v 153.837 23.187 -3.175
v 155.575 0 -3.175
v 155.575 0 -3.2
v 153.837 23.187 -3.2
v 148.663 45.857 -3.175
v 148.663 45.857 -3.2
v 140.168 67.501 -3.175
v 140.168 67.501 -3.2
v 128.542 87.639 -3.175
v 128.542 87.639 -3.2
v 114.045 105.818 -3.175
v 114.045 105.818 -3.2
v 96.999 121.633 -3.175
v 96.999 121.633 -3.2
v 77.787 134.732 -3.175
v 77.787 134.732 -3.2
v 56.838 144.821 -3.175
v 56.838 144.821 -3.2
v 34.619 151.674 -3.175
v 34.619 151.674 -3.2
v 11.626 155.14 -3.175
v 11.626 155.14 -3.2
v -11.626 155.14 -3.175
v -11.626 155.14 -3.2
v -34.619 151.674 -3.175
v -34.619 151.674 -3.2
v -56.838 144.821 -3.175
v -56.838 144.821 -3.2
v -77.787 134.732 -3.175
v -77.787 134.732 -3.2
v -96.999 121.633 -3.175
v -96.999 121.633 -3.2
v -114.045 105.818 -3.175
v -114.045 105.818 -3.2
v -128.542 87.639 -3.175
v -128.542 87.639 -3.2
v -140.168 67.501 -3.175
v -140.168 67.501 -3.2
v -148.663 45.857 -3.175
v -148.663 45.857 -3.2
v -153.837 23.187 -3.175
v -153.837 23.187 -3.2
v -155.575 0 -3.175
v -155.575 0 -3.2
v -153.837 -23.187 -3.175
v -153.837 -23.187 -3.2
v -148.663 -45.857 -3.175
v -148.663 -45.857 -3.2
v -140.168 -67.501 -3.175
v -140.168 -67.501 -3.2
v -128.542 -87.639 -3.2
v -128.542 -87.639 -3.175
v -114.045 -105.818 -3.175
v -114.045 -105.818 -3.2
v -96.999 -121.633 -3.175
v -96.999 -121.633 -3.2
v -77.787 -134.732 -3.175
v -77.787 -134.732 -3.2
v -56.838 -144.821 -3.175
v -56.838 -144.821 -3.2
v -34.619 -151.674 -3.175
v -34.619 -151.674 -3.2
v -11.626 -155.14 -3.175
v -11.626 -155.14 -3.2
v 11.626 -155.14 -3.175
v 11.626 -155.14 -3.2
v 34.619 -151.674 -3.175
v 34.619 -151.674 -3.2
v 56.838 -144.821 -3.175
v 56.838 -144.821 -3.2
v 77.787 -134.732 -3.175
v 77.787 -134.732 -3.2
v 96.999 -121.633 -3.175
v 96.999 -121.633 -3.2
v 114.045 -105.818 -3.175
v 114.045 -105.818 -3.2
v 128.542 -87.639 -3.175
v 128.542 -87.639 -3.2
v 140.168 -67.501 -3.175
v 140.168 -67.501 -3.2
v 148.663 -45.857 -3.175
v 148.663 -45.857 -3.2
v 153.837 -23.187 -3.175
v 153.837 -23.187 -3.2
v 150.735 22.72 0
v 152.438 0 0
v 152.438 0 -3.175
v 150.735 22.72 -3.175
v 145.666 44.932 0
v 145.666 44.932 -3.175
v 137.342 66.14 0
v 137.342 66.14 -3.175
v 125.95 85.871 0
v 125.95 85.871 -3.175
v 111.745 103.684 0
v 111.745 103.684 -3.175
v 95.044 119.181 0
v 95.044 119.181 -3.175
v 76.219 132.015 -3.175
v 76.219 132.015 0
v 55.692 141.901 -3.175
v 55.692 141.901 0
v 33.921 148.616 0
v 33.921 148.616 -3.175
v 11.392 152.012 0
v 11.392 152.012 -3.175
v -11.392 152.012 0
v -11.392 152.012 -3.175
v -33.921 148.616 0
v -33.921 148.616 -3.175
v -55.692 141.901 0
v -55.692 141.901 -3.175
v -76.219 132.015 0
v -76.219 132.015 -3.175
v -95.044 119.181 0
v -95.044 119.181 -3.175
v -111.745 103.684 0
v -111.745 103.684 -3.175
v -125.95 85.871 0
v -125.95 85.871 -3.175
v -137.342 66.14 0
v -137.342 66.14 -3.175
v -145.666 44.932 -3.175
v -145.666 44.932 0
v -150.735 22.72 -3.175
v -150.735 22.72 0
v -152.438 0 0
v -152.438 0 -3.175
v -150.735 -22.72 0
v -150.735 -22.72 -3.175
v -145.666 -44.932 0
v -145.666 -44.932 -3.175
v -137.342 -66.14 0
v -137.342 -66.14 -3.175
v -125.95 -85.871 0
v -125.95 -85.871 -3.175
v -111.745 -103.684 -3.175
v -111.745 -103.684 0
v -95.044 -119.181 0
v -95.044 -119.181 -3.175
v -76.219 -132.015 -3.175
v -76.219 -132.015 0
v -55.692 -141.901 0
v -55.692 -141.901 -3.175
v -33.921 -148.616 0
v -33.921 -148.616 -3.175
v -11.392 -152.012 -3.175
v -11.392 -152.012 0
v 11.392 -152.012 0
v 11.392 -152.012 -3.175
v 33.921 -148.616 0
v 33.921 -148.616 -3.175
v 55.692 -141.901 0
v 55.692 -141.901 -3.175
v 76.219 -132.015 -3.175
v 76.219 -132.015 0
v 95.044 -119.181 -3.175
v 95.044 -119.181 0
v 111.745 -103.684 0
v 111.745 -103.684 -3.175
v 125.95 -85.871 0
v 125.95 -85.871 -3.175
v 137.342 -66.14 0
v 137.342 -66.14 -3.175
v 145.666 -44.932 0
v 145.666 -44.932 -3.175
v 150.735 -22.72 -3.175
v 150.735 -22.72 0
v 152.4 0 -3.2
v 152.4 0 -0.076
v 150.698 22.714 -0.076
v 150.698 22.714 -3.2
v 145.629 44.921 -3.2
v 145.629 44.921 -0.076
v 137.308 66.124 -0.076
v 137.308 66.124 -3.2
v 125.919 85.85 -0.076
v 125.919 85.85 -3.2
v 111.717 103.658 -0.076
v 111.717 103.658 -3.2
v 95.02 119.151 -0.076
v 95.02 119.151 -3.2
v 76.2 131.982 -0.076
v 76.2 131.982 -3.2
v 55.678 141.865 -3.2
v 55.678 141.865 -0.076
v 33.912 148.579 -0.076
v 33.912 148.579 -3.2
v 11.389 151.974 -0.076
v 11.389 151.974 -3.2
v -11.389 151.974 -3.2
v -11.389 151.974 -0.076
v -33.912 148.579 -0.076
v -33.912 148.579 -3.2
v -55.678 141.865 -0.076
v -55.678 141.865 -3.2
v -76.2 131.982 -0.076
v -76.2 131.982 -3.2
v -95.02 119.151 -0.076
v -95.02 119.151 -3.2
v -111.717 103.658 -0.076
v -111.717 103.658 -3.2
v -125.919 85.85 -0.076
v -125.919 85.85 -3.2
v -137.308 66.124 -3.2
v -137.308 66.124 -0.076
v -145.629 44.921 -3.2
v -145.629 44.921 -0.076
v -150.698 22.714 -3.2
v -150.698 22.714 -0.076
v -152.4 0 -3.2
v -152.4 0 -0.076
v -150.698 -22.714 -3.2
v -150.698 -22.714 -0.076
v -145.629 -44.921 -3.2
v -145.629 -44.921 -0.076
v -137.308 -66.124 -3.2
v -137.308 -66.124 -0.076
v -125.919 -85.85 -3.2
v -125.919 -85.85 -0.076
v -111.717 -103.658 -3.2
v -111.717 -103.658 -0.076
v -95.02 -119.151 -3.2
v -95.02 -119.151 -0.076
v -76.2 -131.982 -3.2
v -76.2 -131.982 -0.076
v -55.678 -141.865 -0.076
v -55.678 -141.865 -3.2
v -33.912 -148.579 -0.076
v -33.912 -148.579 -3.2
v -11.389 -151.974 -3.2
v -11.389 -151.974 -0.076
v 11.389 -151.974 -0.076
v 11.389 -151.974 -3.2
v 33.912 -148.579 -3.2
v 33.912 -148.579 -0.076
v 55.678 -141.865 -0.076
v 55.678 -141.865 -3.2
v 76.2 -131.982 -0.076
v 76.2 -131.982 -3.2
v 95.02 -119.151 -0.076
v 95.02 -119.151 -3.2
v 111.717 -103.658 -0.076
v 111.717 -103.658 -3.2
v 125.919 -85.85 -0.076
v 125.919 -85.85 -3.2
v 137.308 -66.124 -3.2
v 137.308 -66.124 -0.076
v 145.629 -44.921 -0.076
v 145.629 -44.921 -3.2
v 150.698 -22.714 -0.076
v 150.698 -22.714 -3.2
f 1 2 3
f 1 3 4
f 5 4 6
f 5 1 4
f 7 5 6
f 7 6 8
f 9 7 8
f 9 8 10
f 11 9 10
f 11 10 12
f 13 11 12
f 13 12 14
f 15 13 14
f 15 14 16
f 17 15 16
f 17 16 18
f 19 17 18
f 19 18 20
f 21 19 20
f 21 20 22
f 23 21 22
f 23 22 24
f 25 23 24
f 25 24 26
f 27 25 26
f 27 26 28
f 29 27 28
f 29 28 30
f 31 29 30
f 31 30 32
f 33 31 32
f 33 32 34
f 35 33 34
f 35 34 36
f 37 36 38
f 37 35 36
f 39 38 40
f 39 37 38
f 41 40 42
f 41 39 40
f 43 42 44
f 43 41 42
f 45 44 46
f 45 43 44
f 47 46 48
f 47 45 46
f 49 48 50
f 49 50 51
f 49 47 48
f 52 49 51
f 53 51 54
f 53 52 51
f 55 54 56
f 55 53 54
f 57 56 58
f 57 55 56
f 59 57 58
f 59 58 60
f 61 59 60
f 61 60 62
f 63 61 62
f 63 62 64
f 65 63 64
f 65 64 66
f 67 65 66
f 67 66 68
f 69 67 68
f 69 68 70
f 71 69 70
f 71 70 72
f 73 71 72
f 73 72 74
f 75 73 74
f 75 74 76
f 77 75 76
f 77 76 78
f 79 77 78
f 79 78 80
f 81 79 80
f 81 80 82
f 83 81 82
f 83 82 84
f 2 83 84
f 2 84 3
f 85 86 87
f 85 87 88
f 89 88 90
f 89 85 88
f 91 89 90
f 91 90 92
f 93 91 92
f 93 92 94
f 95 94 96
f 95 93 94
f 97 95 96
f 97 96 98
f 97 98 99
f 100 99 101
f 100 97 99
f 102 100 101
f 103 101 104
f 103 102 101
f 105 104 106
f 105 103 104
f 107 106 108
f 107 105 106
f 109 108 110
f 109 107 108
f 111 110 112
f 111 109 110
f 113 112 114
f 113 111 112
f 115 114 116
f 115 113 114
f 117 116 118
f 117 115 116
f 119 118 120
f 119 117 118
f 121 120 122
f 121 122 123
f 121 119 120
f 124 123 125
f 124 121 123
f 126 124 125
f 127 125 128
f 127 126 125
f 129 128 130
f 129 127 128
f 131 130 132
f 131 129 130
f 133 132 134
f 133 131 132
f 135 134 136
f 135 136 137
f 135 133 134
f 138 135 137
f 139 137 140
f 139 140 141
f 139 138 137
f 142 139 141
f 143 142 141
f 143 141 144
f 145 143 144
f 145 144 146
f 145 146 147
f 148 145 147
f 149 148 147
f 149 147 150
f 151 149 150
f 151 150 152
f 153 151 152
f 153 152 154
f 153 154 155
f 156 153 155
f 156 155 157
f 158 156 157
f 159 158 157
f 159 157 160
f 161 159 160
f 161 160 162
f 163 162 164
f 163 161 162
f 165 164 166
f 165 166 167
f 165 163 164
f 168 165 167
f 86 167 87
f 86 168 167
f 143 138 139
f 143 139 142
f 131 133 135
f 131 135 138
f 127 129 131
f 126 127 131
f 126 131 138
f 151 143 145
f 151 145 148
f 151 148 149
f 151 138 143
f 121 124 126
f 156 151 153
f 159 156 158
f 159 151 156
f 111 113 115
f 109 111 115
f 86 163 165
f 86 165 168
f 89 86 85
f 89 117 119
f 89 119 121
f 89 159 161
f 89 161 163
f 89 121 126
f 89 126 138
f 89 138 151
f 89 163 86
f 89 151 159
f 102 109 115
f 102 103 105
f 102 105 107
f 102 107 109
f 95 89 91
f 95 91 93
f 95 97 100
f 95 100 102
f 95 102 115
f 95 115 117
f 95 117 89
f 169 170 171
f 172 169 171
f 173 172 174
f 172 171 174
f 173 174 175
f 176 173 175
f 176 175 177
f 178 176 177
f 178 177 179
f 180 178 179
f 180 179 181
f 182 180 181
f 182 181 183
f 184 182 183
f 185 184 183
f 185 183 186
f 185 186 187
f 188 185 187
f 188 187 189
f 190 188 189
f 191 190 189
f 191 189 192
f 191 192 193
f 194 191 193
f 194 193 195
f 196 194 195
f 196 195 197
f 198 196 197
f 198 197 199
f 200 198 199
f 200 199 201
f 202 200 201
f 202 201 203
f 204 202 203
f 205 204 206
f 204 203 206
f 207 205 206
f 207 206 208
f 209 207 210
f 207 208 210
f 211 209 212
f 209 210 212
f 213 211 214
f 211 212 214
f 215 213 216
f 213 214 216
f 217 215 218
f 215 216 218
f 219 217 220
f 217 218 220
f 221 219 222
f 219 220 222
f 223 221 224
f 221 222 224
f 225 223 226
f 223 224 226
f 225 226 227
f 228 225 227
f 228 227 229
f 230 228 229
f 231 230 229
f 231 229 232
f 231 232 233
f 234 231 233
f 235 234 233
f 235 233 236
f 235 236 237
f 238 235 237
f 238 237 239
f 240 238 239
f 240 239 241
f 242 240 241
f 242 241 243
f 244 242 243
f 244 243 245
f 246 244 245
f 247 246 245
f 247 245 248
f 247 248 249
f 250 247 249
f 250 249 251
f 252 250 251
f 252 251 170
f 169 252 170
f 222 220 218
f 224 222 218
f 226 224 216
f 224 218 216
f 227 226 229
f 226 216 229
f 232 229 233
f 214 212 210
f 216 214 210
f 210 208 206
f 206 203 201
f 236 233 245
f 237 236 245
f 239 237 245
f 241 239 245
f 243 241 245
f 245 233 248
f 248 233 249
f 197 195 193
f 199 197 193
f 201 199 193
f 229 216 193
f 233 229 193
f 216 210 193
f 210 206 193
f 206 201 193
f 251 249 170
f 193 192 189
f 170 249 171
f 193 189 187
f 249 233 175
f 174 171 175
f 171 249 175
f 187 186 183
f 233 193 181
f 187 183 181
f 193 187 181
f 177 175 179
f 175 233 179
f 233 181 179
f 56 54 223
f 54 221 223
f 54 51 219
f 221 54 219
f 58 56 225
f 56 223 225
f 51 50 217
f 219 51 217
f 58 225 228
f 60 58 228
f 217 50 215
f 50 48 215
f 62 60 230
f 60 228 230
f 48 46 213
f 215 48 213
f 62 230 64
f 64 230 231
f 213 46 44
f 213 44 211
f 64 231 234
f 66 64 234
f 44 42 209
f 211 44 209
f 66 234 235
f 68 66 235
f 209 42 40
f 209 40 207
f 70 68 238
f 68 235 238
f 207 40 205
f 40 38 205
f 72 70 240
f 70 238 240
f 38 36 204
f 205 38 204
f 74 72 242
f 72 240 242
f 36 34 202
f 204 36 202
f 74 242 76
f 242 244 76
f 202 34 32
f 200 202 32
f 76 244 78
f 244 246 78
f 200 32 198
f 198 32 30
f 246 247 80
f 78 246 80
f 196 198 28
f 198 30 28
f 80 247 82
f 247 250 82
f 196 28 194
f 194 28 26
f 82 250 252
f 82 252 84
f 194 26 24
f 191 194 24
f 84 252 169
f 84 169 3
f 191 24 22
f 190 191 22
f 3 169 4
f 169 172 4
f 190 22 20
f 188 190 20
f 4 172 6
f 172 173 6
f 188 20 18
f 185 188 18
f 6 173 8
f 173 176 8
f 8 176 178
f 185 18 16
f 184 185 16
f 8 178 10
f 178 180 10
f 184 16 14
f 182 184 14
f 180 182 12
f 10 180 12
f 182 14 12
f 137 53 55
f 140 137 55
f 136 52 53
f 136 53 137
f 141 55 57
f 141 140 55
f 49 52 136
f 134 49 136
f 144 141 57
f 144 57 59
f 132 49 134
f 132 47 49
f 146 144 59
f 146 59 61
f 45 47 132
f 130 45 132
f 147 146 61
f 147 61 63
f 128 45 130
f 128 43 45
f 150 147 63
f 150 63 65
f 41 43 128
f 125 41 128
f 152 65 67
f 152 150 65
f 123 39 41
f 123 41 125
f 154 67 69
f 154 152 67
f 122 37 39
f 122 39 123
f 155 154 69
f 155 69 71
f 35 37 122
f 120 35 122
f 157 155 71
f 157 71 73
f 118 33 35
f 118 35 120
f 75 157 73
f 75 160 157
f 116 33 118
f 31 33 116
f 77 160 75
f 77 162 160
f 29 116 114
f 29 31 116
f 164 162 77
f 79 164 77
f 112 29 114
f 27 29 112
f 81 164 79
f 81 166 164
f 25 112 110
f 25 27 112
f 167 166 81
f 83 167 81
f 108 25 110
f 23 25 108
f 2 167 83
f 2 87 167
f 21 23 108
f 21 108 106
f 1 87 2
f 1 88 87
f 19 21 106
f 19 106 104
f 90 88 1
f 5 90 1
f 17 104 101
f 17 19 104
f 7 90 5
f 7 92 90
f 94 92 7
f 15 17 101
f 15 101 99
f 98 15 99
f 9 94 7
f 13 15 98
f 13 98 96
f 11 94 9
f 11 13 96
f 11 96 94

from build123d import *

# Parameters (mm, degrees)
F0_R     = 152.4
F1_DEPTH = 0.0762
F0_R_2   = 155.575
F0_R_3   = 152.4381
F2_DEPTH = 3.2004
F3_DEPTH = 3.175


with BuildPart() as f1:
    # F0 (on Top) → F1 (new body)
    with BuildSketch(Plane.XY):
        Circle(F0_R)
    extrude(amount=-F1_DEPTH)

    # F0 (on Top) → F2 (join)
    with BuildSketch(Plane.XY):
        Circle(F0_R_2)
        Circle(F0_R_3, mode=Mode.SUBTRACT)
        Circle(F0_R_3)
        Circle(F0_R, mode=Mode.SUBTRACT)
    extrude(amount=-F2_DEPTH)

    # F0 (on Top) → F3 (cut)
    with BuildSketch(Plane.XY):
        Circle(F0_R_2)
        Circle(F0_R_3, mode=Mode.SUBTRACT)
    extrude(amount=-F3_DEPTH, mode=Mode.SUBTRACT)


solid = f1.part
